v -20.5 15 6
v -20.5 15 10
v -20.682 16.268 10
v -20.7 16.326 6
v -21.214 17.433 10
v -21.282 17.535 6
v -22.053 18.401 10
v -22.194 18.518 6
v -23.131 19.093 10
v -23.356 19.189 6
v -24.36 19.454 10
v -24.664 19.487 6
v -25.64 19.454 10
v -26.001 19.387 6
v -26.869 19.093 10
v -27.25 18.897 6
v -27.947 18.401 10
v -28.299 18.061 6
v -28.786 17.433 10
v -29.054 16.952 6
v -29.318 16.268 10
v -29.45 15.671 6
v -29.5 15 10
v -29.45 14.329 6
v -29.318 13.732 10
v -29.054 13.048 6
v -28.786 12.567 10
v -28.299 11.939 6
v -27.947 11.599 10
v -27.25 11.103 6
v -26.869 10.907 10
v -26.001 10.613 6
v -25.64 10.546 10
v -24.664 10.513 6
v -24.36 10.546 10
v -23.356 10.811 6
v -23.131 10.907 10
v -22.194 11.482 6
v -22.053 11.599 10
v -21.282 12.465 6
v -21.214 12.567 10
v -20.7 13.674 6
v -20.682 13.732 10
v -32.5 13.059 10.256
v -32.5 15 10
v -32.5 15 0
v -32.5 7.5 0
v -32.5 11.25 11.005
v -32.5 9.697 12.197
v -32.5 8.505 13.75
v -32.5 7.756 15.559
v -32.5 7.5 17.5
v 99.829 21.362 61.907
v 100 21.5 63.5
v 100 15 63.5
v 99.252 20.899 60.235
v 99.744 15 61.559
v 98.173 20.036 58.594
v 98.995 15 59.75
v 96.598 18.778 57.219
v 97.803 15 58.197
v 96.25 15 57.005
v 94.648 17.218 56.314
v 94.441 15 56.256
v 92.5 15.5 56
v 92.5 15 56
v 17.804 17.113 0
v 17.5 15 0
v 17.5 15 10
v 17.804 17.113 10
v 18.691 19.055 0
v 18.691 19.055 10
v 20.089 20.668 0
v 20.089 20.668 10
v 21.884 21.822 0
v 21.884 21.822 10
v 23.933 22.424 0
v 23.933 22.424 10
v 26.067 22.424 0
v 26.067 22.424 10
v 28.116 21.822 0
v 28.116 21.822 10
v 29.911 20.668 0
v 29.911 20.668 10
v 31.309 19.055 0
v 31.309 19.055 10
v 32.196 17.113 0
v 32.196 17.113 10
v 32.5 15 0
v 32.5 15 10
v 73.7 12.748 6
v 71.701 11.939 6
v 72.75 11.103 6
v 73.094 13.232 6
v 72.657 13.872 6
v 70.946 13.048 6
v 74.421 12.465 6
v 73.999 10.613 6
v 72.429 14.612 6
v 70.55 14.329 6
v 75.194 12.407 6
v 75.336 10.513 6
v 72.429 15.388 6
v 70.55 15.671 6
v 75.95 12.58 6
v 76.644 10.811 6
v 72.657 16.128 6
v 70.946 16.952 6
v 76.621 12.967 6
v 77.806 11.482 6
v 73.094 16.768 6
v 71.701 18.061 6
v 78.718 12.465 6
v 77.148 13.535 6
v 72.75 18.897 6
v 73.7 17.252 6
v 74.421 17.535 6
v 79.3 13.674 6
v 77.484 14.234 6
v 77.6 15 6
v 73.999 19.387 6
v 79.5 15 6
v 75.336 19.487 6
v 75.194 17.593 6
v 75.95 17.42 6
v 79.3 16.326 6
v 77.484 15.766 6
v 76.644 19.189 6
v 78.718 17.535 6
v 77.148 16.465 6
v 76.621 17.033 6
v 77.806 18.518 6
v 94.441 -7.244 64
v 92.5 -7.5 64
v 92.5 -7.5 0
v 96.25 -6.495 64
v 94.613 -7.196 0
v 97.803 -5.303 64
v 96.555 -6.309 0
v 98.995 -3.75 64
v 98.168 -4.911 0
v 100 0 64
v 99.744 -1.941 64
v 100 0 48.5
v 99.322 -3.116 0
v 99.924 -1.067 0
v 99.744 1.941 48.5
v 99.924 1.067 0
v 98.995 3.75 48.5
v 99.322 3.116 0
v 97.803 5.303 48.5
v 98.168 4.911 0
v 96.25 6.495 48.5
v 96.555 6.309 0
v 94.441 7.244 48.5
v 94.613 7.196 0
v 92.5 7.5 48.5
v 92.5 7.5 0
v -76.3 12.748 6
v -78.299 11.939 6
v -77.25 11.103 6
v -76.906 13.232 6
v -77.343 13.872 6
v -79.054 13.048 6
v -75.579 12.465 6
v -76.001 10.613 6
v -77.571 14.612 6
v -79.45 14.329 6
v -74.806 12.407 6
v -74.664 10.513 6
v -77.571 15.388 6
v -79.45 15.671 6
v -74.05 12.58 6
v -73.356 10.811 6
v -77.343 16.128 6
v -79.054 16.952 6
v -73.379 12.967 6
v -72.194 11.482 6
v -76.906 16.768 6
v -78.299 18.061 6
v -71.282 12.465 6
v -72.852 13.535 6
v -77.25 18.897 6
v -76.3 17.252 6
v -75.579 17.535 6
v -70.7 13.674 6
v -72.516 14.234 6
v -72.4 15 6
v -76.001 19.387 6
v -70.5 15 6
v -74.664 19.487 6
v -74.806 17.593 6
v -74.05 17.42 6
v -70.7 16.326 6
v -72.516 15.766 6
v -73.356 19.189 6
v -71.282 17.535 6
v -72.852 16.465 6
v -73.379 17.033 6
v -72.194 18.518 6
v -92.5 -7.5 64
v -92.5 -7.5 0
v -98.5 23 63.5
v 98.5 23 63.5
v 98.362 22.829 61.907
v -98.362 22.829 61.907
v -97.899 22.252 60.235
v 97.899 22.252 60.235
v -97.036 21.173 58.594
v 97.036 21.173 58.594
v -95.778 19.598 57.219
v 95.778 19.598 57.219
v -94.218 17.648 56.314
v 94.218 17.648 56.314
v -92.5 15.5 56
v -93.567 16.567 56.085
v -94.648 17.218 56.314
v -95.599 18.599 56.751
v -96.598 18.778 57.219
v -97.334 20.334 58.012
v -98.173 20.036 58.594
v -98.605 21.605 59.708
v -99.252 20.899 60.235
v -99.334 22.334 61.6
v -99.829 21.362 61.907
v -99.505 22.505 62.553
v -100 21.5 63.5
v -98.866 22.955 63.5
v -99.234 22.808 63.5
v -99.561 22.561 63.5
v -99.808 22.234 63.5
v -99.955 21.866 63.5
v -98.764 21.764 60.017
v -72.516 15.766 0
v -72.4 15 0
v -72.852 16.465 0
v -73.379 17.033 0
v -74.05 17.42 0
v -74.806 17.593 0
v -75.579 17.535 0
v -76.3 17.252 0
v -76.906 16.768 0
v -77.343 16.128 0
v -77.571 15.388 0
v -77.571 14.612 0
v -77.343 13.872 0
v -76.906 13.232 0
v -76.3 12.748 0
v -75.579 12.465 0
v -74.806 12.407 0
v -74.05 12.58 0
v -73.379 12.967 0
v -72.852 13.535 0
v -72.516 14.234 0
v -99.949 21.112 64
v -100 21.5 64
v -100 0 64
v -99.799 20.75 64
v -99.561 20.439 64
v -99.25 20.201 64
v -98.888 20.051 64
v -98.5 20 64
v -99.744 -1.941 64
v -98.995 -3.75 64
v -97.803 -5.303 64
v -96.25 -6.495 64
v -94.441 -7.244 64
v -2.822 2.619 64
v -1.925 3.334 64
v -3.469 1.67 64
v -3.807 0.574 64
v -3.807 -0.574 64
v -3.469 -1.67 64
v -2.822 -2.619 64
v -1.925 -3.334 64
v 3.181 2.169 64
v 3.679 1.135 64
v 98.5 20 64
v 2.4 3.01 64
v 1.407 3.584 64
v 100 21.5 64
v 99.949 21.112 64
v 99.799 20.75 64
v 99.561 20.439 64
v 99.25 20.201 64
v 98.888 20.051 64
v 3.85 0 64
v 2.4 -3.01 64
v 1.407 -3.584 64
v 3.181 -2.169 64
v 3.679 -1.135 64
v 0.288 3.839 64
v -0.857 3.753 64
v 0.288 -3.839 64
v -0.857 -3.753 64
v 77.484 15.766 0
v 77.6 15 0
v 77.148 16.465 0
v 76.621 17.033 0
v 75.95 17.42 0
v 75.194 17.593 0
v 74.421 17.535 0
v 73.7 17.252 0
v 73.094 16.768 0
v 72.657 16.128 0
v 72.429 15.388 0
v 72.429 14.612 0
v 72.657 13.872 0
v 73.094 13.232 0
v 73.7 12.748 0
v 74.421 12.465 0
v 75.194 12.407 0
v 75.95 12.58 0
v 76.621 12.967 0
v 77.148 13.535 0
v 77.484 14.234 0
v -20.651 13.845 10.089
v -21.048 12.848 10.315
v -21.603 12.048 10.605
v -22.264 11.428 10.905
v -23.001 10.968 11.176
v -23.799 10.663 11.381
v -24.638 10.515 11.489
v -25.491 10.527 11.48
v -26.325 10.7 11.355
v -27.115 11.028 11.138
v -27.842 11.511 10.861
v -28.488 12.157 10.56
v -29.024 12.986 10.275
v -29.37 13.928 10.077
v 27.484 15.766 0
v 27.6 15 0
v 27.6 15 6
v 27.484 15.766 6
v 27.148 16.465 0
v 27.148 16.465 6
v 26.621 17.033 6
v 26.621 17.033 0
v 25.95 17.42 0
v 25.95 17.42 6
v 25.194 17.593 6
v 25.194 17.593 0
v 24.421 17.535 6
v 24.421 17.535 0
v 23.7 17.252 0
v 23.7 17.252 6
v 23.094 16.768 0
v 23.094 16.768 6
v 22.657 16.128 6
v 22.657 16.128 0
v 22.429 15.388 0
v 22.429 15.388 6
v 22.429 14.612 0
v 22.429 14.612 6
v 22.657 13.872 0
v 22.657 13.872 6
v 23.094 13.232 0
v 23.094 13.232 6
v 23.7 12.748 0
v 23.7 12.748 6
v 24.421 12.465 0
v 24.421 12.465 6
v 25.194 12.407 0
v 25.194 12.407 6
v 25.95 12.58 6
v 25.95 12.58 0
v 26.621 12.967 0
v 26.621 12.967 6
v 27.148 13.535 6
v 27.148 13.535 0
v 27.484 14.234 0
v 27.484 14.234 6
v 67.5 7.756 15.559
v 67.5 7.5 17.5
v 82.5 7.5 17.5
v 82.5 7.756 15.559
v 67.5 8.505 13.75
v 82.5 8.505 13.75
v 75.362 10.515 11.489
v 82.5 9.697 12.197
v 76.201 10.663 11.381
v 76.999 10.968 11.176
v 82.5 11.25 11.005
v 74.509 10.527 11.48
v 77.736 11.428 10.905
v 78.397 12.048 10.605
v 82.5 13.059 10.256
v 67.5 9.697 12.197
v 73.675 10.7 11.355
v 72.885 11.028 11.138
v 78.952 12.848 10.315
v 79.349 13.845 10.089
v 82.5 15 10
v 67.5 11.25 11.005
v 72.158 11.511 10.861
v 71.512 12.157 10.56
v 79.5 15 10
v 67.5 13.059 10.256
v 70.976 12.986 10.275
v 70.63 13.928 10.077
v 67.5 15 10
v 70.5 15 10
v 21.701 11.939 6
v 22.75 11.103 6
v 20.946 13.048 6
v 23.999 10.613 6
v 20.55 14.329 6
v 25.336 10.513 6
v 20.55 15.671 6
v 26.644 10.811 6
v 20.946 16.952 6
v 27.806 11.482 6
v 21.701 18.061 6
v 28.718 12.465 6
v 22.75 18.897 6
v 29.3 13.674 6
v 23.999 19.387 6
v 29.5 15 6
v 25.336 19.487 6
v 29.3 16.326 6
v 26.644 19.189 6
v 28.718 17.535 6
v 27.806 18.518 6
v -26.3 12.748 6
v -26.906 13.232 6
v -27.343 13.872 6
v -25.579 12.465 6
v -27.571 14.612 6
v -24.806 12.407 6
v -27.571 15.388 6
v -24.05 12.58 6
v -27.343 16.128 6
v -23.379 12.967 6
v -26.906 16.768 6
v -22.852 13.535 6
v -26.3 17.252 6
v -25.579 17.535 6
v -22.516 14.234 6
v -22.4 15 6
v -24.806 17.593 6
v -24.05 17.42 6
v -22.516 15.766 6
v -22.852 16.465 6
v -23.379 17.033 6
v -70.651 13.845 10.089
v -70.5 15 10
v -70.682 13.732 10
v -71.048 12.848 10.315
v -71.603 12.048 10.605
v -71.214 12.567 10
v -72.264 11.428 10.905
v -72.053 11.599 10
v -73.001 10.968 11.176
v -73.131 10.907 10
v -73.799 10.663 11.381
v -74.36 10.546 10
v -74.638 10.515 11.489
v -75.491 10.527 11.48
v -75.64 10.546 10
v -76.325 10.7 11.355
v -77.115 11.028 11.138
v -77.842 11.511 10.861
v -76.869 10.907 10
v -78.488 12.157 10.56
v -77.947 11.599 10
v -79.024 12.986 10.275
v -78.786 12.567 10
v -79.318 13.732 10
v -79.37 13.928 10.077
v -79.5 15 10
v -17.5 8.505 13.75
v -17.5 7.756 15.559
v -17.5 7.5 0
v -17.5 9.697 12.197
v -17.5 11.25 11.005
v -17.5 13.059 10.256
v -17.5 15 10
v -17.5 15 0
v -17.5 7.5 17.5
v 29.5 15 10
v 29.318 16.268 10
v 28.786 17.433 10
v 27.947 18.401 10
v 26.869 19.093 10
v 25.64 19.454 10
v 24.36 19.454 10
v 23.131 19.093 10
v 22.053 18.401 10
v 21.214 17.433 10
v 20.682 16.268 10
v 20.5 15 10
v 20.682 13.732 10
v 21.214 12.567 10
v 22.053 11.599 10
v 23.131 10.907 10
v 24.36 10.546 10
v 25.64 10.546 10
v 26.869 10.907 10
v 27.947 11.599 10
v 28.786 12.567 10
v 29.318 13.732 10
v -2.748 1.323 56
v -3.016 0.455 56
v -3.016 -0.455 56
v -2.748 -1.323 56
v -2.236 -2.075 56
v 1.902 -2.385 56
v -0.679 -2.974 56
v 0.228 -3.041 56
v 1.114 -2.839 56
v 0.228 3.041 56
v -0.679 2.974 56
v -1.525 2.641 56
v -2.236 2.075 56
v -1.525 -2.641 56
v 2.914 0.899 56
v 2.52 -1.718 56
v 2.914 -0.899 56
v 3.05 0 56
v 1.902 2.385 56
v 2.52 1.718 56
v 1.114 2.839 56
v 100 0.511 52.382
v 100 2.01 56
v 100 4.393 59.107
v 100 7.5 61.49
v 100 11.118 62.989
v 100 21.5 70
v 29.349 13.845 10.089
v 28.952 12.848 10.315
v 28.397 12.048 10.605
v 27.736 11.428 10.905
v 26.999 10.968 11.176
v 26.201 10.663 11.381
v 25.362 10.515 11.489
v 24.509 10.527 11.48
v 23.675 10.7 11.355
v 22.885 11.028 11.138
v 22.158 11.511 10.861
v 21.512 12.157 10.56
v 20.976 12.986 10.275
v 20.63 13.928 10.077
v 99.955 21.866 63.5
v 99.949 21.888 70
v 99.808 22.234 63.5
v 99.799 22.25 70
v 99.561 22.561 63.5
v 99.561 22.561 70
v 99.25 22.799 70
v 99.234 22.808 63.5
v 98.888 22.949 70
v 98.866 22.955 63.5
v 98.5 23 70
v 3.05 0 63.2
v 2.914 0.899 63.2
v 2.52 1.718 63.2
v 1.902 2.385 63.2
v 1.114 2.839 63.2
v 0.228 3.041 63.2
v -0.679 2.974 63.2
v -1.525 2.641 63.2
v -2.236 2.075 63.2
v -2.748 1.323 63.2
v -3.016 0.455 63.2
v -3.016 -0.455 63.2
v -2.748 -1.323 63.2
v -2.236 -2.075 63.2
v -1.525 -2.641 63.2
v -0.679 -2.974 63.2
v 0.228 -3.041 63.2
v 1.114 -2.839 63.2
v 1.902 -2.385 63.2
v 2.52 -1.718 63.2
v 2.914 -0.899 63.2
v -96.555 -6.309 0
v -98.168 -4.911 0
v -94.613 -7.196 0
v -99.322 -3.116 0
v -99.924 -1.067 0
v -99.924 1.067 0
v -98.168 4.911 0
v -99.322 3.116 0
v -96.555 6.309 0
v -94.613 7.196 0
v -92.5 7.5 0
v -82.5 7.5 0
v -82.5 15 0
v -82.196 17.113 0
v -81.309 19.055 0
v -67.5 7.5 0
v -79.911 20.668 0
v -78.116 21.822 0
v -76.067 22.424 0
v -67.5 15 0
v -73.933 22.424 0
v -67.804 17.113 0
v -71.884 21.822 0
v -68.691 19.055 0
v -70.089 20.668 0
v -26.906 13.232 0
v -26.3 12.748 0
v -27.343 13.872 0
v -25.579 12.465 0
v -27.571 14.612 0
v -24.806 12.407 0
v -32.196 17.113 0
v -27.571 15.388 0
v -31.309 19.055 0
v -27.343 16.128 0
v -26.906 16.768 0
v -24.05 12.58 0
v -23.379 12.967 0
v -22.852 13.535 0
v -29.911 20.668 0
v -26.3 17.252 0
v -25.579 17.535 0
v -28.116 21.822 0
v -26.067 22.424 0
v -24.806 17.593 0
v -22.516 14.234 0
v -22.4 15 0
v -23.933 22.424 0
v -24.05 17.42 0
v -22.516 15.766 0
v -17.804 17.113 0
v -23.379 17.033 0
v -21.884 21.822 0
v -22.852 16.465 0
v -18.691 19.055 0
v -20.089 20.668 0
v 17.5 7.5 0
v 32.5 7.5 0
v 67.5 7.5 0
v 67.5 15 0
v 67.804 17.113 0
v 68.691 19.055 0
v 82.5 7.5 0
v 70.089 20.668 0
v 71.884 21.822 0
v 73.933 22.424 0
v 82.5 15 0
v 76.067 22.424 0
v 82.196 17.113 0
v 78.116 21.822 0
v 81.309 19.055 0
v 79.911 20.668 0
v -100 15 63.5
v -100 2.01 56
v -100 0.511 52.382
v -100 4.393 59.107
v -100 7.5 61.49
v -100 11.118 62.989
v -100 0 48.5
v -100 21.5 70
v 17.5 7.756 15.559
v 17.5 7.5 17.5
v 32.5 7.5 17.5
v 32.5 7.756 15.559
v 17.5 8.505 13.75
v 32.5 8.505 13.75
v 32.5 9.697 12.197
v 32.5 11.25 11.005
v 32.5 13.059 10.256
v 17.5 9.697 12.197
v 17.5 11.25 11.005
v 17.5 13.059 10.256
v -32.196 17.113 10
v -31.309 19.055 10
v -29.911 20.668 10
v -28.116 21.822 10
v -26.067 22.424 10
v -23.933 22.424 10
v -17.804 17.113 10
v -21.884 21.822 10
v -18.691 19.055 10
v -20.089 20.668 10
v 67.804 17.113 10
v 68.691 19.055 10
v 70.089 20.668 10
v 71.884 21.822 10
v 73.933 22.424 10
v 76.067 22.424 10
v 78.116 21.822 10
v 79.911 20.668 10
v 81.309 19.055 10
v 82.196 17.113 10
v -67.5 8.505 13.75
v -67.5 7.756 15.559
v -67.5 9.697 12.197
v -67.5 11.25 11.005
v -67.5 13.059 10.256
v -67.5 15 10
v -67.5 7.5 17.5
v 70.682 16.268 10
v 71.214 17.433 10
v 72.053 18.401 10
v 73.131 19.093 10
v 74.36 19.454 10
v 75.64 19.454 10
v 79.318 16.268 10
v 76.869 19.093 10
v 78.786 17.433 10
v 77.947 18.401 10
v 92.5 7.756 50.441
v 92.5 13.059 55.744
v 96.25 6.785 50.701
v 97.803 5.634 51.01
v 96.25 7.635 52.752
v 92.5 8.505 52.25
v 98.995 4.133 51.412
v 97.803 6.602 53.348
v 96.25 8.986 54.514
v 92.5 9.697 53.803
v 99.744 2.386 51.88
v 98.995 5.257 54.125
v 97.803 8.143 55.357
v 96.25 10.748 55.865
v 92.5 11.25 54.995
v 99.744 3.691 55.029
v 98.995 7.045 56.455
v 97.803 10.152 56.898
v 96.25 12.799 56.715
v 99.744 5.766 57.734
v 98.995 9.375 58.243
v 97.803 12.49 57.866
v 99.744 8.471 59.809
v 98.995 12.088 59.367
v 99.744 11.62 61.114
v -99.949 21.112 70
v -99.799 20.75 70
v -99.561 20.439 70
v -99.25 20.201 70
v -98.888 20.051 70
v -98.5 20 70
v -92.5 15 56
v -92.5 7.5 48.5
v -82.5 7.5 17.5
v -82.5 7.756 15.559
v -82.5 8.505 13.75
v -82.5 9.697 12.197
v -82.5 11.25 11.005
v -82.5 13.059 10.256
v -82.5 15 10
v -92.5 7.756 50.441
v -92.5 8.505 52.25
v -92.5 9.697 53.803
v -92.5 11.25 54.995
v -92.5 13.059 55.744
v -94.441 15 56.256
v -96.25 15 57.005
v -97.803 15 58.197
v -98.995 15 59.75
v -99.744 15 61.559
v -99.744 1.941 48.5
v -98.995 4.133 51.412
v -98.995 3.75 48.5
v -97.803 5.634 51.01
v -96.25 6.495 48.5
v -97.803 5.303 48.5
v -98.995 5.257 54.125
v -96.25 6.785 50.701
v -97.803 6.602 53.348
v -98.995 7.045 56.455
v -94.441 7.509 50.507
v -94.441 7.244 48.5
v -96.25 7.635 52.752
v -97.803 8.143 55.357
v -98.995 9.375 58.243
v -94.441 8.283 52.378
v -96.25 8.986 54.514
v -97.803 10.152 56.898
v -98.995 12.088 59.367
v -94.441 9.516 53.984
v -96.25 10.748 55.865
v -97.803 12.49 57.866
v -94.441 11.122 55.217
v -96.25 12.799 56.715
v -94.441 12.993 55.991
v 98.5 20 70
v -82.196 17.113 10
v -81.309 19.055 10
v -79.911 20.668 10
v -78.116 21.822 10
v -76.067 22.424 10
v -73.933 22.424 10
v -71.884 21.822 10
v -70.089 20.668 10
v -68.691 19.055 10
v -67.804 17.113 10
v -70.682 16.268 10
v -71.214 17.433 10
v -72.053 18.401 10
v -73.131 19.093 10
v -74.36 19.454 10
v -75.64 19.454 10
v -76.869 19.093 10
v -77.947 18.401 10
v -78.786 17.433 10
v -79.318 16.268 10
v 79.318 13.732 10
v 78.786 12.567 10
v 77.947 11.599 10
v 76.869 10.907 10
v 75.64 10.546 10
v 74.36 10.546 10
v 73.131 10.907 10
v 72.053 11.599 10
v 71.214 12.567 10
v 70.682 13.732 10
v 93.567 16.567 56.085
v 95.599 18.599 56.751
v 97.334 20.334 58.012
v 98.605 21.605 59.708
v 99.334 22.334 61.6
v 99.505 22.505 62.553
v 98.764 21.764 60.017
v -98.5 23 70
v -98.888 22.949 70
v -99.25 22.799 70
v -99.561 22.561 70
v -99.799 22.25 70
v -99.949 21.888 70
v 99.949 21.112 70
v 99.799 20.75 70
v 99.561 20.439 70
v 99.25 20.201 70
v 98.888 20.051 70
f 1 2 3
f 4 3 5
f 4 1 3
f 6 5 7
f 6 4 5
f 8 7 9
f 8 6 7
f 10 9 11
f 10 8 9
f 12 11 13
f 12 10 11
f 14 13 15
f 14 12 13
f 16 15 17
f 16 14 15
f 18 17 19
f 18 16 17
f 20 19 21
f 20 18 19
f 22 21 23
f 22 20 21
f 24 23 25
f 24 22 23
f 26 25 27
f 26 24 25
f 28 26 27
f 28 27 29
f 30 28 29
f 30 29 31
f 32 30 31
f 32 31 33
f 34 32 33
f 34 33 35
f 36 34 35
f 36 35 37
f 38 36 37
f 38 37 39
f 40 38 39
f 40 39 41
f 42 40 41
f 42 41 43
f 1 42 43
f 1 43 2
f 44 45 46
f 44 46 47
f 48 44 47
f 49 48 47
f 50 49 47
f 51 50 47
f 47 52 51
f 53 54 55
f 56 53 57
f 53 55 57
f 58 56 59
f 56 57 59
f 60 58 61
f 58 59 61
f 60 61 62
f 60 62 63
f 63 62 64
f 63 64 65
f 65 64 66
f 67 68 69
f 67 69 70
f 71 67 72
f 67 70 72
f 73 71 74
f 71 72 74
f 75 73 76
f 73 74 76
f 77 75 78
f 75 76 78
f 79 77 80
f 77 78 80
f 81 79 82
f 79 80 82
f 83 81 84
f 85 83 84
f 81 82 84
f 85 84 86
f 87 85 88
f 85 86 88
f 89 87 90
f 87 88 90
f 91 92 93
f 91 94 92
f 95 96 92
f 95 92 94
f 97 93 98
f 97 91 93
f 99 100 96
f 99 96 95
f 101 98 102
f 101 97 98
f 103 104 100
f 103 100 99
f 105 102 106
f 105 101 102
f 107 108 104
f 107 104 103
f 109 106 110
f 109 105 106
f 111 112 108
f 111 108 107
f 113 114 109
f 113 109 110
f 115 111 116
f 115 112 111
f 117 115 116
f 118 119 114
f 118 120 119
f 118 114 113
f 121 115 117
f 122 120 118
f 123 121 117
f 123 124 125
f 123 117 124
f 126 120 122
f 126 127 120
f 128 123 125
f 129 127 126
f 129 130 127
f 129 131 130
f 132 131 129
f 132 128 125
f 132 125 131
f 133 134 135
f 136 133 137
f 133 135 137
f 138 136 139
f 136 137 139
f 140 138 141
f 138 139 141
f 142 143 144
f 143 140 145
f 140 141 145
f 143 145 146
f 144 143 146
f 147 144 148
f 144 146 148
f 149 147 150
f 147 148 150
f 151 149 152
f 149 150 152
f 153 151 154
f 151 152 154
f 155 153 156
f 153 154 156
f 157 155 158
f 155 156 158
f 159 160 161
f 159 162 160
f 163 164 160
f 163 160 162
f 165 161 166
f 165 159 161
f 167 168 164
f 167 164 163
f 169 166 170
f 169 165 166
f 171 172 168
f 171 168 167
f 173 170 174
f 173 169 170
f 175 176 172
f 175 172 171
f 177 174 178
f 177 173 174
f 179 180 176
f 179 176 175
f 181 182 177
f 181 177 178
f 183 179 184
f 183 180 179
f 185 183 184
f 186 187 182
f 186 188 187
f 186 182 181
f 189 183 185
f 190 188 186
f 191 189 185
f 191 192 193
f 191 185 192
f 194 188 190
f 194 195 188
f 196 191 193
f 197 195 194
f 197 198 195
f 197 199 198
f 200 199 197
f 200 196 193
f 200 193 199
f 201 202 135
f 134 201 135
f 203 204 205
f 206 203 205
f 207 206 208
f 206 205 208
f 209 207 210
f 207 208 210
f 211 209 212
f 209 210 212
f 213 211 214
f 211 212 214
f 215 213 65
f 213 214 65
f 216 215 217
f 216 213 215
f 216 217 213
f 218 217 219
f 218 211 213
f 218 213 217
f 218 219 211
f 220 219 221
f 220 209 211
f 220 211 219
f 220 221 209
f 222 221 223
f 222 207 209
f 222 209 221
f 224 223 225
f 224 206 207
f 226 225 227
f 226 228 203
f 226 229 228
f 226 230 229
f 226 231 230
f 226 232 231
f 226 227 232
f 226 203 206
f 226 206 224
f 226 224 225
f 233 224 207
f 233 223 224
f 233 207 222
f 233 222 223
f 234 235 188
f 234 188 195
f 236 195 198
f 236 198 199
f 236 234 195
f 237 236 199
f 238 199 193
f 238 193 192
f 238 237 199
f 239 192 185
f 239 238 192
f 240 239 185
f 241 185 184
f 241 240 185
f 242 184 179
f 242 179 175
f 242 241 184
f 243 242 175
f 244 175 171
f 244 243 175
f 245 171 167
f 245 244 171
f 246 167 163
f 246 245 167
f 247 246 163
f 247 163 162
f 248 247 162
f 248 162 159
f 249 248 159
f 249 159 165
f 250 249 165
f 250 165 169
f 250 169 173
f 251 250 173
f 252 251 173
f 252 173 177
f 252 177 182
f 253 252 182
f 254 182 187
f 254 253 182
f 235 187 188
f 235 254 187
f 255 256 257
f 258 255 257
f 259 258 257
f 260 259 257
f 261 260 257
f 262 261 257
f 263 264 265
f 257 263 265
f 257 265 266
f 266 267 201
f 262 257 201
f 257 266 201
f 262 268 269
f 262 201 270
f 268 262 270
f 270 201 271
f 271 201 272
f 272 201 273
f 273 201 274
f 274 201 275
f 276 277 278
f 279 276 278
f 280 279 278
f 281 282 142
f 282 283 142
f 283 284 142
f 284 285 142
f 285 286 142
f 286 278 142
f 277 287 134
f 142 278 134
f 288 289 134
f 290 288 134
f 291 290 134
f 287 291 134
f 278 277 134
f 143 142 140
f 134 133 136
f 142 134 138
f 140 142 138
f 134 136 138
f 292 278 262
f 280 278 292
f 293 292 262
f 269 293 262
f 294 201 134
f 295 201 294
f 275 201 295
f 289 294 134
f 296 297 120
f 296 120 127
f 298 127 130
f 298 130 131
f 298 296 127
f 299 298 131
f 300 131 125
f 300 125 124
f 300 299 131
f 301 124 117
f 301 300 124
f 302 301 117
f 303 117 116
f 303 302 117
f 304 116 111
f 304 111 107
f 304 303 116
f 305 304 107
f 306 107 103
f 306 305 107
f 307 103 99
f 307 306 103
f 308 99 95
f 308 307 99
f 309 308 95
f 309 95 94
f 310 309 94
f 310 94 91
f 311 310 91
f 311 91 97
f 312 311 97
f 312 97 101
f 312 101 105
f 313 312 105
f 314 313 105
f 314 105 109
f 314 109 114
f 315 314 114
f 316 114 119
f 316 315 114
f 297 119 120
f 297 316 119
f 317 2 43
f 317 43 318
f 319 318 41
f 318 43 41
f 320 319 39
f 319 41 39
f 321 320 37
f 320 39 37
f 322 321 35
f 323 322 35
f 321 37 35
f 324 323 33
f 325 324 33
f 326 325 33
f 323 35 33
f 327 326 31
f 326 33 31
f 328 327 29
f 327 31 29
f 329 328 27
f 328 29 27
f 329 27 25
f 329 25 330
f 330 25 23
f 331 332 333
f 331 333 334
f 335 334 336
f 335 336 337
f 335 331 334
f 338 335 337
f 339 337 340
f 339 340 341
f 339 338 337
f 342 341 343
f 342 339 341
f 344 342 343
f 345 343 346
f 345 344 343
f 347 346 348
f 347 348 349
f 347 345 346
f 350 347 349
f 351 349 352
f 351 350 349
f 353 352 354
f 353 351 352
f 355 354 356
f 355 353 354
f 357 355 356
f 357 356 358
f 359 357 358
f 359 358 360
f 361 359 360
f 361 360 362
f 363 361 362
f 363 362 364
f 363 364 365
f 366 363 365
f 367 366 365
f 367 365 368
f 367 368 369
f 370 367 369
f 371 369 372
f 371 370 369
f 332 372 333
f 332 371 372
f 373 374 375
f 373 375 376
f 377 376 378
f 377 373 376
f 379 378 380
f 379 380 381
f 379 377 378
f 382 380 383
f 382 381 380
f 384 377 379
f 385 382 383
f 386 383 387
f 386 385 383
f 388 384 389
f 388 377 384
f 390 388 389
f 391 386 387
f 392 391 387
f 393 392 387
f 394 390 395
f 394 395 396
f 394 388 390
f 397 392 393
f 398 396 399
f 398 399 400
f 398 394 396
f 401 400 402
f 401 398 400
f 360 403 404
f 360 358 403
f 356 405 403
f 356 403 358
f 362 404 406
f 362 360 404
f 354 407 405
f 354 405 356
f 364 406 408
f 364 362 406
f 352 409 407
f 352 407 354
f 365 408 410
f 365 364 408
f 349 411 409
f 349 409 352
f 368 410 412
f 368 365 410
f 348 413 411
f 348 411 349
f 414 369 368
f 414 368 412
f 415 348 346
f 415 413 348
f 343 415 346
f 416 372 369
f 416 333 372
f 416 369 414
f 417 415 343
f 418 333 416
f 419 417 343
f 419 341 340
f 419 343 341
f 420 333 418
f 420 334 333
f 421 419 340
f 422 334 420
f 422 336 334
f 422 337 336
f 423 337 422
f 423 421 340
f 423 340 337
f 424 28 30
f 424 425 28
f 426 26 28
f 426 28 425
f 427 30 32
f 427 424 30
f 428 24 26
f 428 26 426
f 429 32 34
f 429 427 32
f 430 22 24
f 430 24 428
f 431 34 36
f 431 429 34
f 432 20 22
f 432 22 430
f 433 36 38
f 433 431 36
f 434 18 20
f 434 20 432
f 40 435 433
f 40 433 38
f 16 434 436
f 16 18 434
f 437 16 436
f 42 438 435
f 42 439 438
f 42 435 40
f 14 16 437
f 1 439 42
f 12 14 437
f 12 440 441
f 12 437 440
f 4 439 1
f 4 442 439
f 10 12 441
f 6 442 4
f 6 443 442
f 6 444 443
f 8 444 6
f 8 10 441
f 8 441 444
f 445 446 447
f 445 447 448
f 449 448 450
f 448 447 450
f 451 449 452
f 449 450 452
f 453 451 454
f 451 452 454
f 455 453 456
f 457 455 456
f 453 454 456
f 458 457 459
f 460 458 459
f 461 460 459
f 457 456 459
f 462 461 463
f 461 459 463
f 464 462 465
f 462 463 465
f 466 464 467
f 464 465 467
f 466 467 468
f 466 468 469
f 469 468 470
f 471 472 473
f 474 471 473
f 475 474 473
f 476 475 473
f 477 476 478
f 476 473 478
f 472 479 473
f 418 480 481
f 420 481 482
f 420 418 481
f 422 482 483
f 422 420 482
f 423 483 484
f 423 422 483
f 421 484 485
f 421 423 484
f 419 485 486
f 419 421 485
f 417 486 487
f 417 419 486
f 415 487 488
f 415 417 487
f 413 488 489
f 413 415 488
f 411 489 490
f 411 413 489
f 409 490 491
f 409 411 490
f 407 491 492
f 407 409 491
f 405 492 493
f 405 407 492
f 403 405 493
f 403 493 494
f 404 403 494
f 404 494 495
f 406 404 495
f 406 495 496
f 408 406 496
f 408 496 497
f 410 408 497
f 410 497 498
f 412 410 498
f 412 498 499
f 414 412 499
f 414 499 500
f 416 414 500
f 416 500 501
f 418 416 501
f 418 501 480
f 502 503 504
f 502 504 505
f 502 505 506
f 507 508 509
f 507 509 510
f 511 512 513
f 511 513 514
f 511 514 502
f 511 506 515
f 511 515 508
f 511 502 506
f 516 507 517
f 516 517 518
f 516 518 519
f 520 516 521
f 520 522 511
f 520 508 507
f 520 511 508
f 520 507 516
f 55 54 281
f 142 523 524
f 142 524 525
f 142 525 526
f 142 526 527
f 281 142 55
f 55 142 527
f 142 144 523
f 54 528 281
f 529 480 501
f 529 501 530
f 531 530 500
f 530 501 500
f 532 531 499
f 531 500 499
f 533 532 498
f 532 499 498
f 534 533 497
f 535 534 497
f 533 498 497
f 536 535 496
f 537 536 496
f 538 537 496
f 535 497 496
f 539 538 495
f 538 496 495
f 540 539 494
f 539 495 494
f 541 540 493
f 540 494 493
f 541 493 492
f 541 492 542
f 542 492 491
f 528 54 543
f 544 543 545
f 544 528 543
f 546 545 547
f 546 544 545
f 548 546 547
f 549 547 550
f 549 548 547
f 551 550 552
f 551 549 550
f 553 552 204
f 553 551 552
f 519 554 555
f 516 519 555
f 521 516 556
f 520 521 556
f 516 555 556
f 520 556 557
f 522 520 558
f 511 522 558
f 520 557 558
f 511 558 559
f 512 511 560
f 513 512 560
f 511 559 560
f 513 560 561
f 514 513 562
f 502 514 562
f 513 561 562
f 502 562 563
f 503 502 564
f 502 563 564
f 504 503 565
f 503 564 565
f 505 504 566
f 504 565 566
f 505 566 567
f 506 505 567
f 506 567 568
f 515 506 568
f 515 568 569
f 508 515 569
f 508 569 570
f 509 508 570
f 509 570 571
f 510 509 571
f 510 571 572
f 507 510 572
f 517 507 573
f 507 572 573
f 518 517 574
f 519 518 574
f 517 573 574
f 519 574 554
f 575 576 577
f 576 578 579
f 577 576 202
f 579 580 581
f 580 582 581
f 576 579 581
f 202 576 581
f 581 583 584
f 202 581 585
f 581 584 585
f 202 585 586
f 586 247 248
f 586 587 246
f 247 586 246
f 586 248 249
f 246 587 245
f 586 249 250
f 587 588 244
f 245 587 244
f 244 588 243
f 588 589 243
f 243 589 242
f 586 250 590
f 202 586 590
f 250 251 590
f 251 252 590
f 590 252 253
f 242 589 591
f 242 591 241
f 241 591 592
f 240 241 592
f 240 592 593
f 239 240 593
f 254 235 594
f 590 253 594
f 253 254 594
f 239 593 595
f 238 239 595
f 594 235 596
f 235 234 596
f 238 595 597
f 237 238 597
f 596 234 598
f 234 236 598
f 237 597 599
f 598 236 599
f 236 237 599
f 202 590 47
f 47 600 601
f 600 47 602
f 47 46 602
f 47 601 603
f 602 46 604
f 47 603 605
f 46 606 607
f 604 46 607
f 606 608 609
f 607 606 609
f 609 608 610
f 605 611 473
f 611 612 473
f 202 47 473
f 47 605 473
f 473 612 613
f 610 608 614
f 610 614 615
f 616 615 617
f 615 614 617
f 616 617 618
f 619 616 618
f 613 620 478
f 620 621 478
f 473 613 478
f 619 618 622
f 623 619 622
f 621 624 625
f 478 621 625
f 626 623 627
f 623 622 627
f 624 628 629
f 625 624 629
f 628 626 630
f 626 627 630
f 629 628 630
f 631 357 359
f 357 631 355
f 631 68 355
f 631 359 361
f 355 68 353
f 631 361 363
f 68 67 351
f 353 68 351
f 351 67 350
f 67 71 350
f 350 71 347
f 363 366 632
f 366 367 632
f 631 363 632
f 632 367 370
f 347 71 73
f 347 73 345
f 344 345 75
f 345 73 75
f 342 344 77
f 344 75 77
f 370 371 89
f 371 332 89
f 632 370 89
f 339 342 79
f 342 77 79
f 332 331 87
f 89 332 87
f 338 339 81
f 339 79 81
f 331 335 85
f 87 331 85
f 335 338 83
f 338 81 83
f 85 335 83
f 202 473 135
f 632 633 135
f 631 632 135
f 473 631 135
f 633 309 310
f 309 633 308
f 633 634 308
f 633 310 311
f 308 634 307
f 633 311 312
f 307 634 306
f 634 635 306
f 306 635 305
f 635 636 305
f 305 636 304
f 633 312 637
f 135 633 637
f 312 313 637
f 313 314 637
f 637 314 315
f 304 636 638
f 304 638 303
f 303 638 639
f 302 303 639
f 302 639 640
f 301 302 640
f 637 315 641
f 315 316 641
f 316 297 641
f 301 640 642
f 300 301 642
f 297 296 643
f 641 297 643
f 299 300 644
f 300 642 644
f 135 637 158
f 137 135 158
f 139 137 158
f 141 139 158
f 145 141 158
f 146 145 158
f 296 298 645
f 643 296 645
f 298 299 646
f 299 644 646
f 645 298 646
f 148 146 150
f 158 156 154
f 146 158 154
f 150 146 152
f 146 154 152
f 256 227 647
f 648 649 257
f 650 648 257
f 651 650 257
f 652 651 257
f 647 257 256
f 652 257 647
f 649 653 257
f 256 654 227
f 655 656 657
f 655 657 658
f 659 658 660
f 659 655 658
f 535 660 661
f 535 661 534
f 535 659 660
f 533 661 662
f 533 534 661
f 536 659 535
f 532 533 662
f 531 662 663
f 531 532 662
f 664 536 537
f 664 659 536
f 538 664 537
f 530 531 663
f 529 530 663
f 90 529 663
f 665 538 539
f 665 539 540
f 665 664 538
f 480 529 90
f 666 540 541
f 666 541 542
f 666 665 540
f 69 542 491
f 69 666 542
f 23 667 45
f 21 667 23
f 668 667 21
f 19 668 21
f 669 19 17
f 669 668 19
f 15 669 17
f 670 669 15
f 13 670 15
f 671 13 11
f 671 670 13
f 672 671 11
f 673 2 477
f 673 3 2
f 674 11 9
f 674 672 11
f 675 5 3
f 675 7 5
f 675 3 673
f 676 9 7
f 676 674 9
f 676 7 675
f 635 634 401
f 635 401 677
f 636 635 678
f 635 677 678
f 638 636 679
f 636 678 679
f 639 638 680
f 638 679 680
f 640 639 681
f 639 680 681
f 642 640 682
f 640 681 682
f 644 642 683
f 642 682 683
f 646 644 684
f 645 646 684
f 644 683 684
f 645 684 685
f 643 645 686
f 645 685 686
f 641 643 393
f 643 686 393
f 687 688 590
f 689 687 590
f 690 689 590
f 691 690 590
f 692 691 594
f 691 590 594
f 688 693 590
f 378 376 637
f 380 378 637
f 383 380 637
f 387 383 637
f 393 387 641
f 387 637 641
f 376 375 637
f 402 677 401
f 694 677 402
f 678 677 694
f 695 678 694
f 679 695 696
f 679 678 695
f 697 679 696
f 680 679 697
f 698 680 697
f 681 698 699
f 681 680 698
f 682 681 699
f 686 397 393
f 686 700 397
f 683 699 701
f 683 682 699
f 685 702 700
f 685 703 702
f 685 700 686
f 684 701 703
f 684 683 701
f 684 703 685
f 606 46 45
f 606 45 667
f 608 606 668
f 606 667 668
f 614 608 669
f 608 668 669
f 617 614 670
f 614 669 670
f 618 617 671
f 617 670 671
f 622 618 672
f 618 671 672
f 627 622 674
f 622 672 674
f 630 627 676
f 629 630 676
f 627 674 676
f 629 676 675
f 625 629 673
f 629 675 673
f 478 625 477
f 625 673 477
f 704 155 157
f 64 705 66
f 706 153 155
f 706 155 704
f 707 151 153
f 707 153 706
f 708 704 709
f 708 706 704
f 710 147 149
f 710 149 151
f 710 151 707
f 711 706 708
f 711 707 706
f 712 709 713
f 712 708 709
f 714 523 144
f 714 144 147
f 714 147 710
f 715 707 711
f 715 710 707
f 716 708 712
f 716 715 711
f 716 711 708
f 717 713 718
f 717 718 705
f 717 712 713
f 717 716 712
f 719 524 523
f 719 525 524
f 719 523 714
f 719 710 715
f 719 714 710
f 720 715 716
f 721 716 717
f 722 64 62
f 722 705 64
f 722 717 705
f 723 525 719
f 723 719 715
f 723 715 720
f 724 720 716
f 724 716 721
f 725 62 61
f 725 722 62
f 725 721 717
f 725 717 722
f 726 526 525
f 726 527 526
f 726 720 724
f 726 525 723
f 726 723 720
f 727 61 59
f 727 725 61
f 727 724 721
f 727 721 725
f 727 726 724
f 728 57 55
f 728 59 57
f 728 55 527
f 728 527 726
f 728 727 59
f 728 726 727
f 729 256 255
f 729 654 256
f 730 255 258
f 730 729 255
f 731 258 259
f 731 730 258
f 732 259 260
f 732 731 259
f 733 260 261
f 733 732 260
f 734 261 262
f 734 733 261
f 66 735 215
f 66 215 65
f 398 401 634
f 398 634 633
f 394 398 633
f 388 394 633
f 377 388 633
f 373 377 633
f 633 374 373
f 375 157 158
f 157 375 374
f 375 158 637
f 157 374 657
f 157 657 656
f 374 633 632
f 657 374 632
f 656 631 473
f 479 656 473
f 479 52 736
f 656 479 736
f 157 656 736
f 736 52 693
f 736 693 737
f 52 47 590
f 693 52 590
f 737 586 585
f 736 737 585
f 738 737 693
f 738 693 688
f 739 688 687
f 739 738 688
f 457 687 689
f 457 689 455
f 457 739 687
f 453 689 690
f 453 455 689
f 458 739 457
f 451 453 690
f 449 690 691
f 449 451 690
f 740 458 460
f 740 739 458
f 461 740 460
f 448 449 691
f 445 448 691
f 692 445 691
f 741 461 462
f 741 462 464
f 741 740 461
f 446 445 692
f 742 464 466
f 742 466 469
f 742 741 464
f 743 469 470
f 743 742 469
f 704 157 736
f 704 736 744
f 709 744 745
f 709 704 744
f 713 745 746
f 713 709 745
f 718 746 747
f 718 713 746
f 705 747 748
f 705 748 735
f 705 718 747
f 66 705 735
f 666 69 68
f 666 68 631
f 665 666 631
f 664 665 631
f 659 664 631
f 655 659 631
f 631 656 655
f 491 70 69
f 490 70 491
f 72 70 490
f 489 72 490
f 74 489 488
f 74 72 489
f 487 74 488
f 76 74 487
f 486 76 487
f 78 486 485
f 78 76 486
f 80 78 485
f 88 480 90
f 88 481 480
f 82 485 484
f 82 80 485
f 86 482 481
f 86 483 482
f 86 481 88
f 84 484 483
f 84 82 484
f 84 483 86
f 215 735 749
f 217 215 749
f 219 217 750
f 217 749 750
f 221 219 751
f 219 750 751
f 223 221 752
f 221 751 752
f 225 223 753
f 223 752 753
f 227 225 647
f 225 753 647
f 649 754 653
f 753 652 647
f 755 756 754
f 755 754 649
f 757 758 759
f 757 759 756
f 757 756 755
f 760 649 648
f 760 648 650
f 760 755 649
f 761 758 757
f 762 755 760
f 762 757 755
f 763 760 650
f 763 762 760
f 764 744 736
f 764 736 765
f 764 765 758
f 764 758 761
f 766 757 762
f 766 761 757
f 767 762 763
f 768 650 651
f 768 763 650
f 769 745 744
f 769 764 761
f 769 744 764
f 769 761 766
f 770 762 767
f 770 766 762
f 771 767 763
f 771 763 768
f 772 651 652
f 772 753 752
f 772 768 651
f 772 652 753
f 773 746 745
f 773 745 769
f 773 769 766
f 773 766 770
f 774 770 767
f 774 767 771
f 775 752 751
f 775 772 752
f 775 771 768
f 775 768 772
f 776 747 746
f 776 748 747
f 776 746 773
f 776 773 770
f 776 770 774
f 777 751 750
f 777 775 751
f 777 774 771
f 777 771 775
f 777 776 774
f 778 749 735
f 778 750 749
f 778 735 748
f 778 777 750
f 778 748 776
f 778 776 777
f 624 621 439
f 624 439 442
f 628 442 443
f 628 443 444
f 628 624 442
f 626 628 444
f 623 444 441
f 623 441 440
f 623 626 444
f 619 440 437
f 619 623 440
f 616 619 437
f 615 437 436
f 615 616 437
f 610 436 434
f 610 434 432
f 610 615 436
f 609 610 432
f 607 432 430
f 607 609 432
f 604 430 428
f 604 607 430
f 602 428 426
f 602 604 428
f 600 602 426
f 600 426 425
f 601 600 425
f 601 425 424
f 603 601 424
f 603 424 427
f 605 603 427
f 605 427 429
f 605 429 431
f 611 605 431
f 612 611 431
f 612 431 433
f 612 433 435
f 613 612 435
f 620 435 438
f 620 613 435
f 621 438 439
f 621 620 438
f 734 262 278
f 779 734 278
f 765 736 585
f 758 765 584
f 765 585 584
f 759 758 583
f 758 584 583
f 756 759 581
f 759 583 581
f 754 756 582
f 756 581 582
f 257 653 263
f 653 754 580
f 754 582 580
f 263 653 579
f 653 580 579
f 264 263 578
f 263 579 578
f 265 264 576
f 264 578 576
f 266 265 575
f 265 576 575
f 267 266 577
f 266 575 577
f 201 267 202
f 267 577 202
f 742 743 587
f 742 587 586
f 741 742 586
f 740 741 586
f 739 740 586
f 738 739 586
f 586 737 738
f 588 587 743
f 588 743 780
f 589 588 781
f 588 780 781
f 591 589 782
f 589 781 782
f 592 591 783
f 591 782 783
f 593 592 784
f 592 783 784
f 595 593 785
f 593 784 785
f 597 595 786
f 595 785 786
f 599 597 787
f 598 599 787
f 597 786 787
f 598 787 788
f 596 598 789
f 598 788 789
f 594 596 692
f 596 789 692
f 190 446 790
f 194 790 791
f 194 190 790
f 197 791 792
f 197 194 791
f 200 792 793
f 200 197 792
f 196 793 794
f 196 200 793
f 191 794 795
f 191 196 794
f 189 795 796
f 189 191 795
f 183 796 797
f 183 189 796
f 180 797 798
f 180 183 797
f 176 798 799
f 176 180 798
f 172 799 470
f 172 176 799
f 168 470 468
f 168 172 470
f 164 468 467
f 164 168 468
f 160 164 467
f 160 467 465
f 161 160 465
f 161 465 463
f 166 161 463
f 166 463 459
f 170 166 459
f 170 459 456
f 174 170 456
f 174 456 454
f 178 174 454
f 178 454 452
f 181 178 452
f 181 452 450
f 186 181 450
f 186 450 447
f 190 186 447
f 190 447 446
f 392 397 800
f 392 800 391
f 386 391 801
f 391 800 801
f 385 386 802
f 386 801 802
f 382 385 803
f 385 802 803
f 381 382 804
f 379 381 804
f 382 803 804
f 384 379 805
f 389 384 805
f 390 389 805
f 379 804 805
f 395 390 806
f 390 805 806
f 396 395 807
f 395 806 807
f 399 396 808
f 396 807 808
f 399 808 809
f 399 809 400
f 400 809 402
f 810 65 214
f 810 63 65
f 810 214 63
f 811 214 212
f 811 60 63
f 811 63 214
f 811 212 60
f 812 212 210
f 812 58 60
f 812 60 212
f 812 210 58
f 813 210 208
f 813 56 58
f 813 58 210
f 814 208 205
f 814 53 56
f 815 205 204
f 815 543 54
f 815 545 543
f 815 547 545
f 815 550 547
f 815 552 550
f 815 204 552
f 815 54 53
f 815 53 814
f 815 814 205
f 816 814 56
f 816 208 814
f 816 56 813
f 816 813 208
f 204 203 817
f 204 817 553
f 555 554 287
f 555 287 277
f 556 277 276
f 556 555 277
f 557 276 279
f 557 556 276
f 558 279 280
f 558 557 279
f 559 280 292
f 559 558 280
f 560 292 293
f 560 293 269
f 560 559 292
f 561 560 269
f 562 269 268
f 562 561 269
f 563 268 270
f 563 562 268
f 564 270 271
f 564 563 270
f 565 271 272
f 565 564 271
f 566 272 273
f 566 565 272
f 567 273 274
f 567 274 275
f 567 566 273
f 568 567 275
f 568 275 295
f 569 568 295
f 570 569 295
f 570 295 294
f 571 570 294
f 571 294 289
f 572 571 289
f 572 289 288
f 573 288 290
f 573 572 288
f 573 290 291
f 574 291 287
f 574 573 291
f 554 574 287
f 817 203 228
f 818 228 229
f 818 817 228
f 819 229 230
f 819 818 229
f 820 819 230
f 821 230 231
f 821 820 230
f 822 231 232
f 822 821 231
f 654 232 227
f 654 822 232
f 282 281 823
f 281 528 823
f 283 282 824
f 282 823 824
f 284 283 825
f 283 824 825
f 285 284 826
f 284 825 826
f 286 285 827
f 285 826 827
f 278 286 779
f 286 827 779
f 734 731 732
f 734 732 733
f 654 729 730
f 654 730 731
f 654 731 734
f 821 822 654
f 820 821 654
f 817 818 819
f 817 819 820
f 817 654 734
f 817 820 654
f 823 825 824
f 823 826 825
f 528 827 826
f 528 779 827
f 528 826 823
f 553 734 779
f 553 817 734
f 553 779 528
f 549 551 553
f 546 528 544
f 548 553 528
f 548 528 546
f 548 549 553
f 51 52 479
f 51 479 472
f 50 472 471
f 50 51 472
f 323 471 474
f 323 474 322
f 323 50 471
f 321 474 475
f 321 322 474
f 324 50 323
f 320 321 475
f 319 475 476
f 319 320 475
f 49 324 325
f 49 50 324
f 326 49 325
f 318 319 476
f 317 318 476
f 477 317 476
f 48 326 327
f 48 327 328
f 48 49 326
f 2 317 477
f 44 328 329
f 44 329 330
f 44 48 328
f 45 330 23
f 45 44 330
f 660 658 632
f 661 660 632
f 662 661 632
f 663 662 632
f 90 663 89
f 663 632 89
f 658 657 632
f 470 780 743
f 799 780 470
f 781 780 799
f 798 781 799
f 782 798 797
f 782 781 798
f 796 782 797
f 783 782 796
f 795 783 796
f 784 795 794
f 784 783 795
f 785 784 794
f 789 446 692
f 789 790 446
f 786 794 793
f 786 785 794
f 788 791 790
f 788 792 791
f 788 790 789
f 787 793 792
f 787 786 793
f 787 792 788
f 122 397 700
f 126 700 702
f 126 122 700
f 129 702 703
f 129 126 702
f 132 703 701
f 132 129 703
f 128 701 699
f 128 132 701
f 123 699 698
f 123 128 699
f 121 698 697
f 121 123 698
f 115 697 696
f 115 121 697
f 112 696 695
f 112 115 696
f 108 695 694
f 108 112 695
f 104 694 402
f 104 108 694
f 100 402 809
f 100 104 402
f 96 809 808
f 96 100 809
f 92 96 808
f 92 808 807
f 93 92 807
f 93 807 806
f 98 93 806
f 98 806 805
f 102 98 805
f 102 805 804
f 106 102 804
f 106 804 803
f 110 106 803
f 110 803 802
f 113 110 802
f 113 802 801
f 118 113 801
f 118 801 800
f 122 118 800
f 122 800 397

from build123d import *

# Parameters (mm, degrees)
SKETCH1_W             = 15
SKETCH1_H             = 15
SKETCH1_R             = 2.6
BOSS_EXTRUDE1_DEPTH   = 6
BOSS_EXTRUDE1_2_DEPTH = 6
BOSS_EXTRUDE1_3_DEPTH = 6
BOSS_EXTRUDE1_4_DEPTH = 6
BOSS_EXTRUDE2_DEPTH   = 64
SKETCH2_R             = 3.05
CUT_EXTRUDE1_DEPTH    = 8
SKETCH3_W             = 15
SKETCH3_H             = 15
SKETCH3_R             = 4.5
BOSS_EXTRUDE3_DEPTH   = 4
CHAMFER1_SIZE         = 0.8
SKETCH4_W             = 200
SKETCH4_H             = 8
BOSS_EXTRUDE4_DEPTH   = 15.5
SKETCH5_W             = 200
SKETCH5_H             = 3
BOSS_EXTRUDE5_DEPTH   = 6
FILLET3_R             = 7.5
FILLET4_R             = 1.5


# Some blends are built 0.0001 mm under size
with BuildPart() as part:
    # Sketch1 → Boss-Extrude1 (new body)
    with BuildSketch(Plane.XY):
        with Locations((-25, 15)):
            Rectangle(SKETCH1_W, SKETCH1_H)
        with Locations((-25, 15)):
            Circle(SKETCH1_R, mode=Mode.SUBTRACT)
    extrude(amount=BOSS_EXTRUDE1_DEPTH)



with BuildPart() as body_2:
    # Sketch1 → Boss-Extrude1 2 (new body)
    with BuildSketch(Plane.XY):
        with Locations((25, 15)):
            Rectangle(SKETCH1_W, SKETCH1_H)
        with Locations((25, 15)):
            Circle(SKETCH1_R, mode=Mode.SUBTRACT)
    extrude(amount=BOSS_EXTRUDE1_2_DEPTH)


with BuildPart() as body_3:
    # Sketch1 → Boss-Extrude1 3 (new body)
    with BuildSketch(Plane.XY):
        with Locations((-75, 15)):
            Rectangle(SKETCH1_W, SKETCH1_H)
        with Locations((-75, 15)):
            Circle(SKETCH1_R, mode=Mode.SUBTRACT)
    extrude(amount=BOSS_EXTRUDE1_3_DEPTH)


with BuildPart() as body_4:
    # Sketch1 → Boss-Extrude1 4 (new body)
    with BuildSketch(Plane.XY):
        with Locations((75, 15)):
            Rectangle(SKETCH1_W, SKETCH1_H)
        with Locations((75, 15)):
            Circle(SKETCH1_R, mode=Mode.SUBTRACT)
    extrude(amount=BOSS_EXTRUDE1_4_DEPTH)


with BuildPart() as part_1:
    add(part.part)

    add(body_2.part)  # Boss-Extrude2 merges body 2

    add(body_3.part)  # Boss-Extrude2 merges body 3
    # Sketch1<4> → Boss-Extrude2 (add)
    with BuildSketch(Plane.XY):
        Polygon((-100, 7.5), (-100, -7.5), (100, -7.5), (100, 7.5), (82.5, 7.5), (67.5, 7.5), (32.5, 7.5), (17.5, 7.5), (-17.5, 7.5), (-32.5, 7.5), (-67.5, 7.5), (-82.5, 7.5), align=None)
    extrude(amount=BOSS_EXTRUDE2_DEPTH)

    # Sketch2 → Cut-Extrude1 (cut)
    with BuildSketch(Plane.XY.offset(64)):
        Circle(SKETCH2_R)
    extrude(amount=-CUT_EXTRUDE1_DEPTH, mode=Mode.SUBTRACT)


    add(body_4.part)  # Boss-Extrude3 merges body 4
    # Sketch3 → Boss-Extrude3 (add)
    # profile 1 of 4: a face of its own
    with BuildSketch(Plane.XY.offset(6)):
        with Locations((75, 15)):
            Rectangle(SKETCH3_W, SKETCH3_H)
        with Locations((75, 15)):
            Circle(SKETCH3_R, mode=Mode.SUBTRACT)
    # profile 2 of 4: a face of its own
    with BuildSketch(Plane.XY.offset(6)):
        with Locations((25, 15)):
            Rectangle(SKETCH3_W, SKETCH3_H)
        with Locations((25, 15)):
            Circle(SKETCH3_R, mode=Mode.SUBTRACT)
    # profile 3 of 4: a face of its own
    with BuildSketch(Plane.XY.offset(6)):
        with Locations((-25, 15)):
            Rectangle(SKETCH3_W, SKETCH3_H)
        with Locations((-25, 15)):
            Circle(SKETCH3_R, mode=Mode.SUBTRACT)
    # profile 4 of 4: a face of its own
    with BuildSketch(Plane.XY.offset(6)):
        with Locations((-75, 15)):
            Rectangle(SKETCH3_W, SKETCH3_H)
        with Locations((-75, 15)):
            Circle(SKETCH3_R, mode=Mode.SUBTRACT)
    extrude(amount=BOSS_EXTRUDE3_DEPTH)

    # Chamfer1
    chamfer1_edges = [part_1.edges().sort_by_distance(p)[0] for p in [
        (-3.05, 0, 64),
    ]]
    chamfer(chamfer1_edges, length=CHAMFER1_SIZE)

    # Sketch4 → Boss-Extrude4 (add)
    with BuildSketch(Plane(origin=(0, 7.5, 0), x_dir=(1, 0, 0), z_dir=(0, 1, 0))):
        with Locations((0, -60)):
            Rectangle(SKETCH4_W, SKETCH4_H)
    extrude(amount=BOSS_EXTRUDE4_DEPTH)

    # Sketch5 → Boss-Extrude5 (add)
    with BuildSketch(Plane.XY.offset(64)):
        with Locations((0, 21.5)):
            Rectangle(SKETCH5_W, SKETCH5_H)
    extrude(amount=BOSS_EXTRUDE5_DEPTH)

    # Fillet3
    # the kernel refuses this fillet: 7.5 mm, written as the material it adds along each edge
    with BuildSketch(Plane(origin=(-82.5, 7.5, 10), x_dir=(0, 1, 0), z_dir=(1, 0, 0))) as fillet3_piece_1_section:
        with BuildLine():
            CenterArc((FILLET3_R, FILLET3_R), FILLET3_R, 180, 90)
            Line((0, FILLET3_R), (0, 0))
            Line((0, 0), (FILLET3_R, 0))
        make_face()
    fillet3_piece_1 = extrude(amount=15, mode=Mode.PRIVATE)
    fillet3_piece_1 = fillet3_piece_1 - Plane(origin=(-75, 15, 10), x_dir=(1, 0, 0), z_dir=(0, 0, -1)) * Cylinder(4.5, 60, mode=Mode.PRIVATE)
    add(fillet3_piece_1)
    with BuildSketch(Plane(origin=(-32.5, 7.5, 10), x_dir=(0, 1, 0), z_dir=(1, 0, 0))) as fillet3_piece_2_section:
        with BuildLine():
            CenterArc((FILLET3_R, FILLET3_R), FILLET3_R, 180, 90)
            Line((0, FILLET3_R), (0, 0))
            Line((0, 0), (FILLET3_R, 0))
        make_face()
    fillet3_piece_2 = extrude(amount=15, mode=Mode.PRIVATE)
    fillet3_piece_2 = fillet3_piece_2 - Plane(origin=(-25, 15, 10), x_dir=(1, 0, 0), z_dir=(0, 0, -1)) * Cylinder(4.5, 61, mode=Mode.PRIVATE)
    add(fillet3_piece_2)
    with BuildSketch(Plane(origin=(17.5, 7.5, 10), x_dir=(0, 1, 0), z_dir=(1, 0, 0))) as fillet3_piece_3_section:
        with BuildLine():
            CenterArc((FILLET3_R, FILLET3_R), FILLET3_R, 180, 90)
            Line((0, FILLET3_R), (0, 0))
            Line((0, 0), (FILLET3_R, 0))
        make_face()
    fillet3_piece_3 = extrude(amount=15, mode=Mode.PRIVATE)
    fillet3_piece_3 = fillet3_piece_3 - Plane(origin=(25, 15, 10), x_dir=(1, 0, 0), z_dir=(0, 0, -1)) * Cylinder(4.5, 61, mode=Mode.PRIVATE)
    add(fillet3_piece_3)
    with BuildSketch(Plane(origin=(67.5, 7.5, 10), x_dir=(0, 1, 0), z_dir=(1, 0, 0))) as fillet3_piece_4_section:
        with BuildLine():
            CenterArc((FILLET3_R, FILLET3_R), FILLET3_R, 180, 90)
            Line((0, FILLET3_R), (0, 0))
            Line((0, 0), (FILLET3_R, 0))
        make_face()
    fillet3_piece_4 = extrude(amount=15, mode=Mode.PRIVATE)
    fillet3_piece_4 = fillet3_piece_4 - Plane(origin=(75, 15, 10), x_dir=(1, 0, 0), z_dir=(0, 0, -1)) * Cylinder(4.5, 60, mode=Mode.PRIVATE)
    add(fillet3_piece_4)
    with BuildSketch(Plane(origin=(100, 7.5, 56), x_dir=(0, 0, -1), z_dir=(-1, 0, 0))) as fillet3_piece_5:
        with BuildLine():
            CenterArc((FILLET3_R, -FILLET3_R), FILLET3_R, 90, 90)
            Line((0, -FILLET3_R), (0, 0))
            Line((0, 0), (FILLET3_R, 0))
        make_face()
    extrude(amount=200)
    # the kernel refuses this fillet: 7.5 mm, written as the material it takes off along each edge
    with BuildSketch(Plane(origin=(100, -7.5, -18.75), x_dir=(-1, 0, 0), z_dir=(0, 0, 1))) as fillet3_2_piece_1:
        with BuildLine():
            CenterArc((FILLET3_R, -FILLET3_R), FILLET3_R, 90, 90)
            Line((0, -FILLET3_R), (0, 0))
            Line((0, 0), (FILLET3_R, 0))
        make_face()
    extrude(amount=101.5, mode=Mode.SUBTRACT)
    with BuildSketch(Plane(origin=(-100, -7.5, -18.75), x_dir=(1, 0, 0), z_dir=(0, 0, 1))) as fillet3_2_piece_2:
        with BuildLine():
            CenterArc((FILLET3_R, FILLET3_R), FILLET3_R, 180, 90)
            Line((0, FILLET3_R), (0, 0))
            Line((0, 0), (FILLET3_R, 0))
        make_face()
    extrude(amount=101.5, mode=Mode.SUBTRACT)
    with BuildSketch(Plane(origin=(67.5, 22.5, 28.75), x_dir=(0, -1, 0), z_dir=(0, 0, -1)), Plane(origin=(-82.5, 22.5, 28.75), x_dir=(0, -1, 0), z_dir=(0, 0, -1)), Plane(origin=(17.5, 22.5, 28.75), x_dir=(0, -1, 0), z_dir=(0, 0, -1)), Plane(origin=(-32.5, 22.5, 28.75), x_dir=(0, -1, 0), z_dir=(0, 0, -1))) as fillet3_2_piece_3:
        with BuildLine():
            CenterArc((FILLET3_R, -FILLET3_R), FILLET3_R, 90, 90)
            Line((0, -FILLET3_R), (0, 0))
            Line((0, 0), (FILLET3_R, 0))
        make_face()
    extrude(amount=47.5, mode=Mode.SUBTRACT)
    with BuildSketch(Plane(origin=(-67.5, 22.5, -18.75), x_dir=(-1, 0, 0), z_dir=(0, 0, 1)), Plane(origin=(-17.5, 22.5, -18.75), x_dir=(-1, 0, 0), z_dir=(0, 0, 1)), Plane(origin=(32.5, 22.5, -18.75), x_dir=(-1, 0, 0), z_dir=(0, 0, 1)), Plane(origin=(82.5, 22.5, -18.75), x_dir=(-1, 0, 0), z_dir=(0, 0, 1))) as fillet3_2_piece_4:
        with BuildLine():
            CenterArc((FILLET3_R, FILLET3_R), FILLET3_R, 180, 90)
            Line((0, FILLET3_R), (0, 0))
            Line((0, 0), (FILLET3_R, 0))
        make_face()
    extrude(amount=47.5, mode=Mode.SUBTRACT)
    with BuildSketch(Plane(origin=(118.75, 23, 56), x_dir=(0, -1, 0), z_dir=(-1, 0, 0))) as fillet3_2_piece_5:
        with BuildLine():
            CenterArc((FILLET3_R, FILLET3_R), FILLET3_R, 180, 90)
            Line((0, FILLET3_R), (0, 0))
            Line((0, 0), (FILLET3_R, 0))
        make_face()
    extrude(amount=237.5, mode=Mode.SUBTRACT)
    # the kernel refuses this fillet: 7.5 mm, written as the material it takes off along each edge
    with BuildSketch(Plane(origin=(-100, 7.5, -18.75), x_dir=(0, -1, 0), z_dir=(0, 0, 1)), Plane(origin=(100, 7.5, -18.75), x_dir=(-1, 0, 0), z_dir=(0, 0, 1))) as fillet3_3_piece_1:
        with BuildLine():
            CenterArc((FILLET3_R, FILLET3_R), FILLET3_R, 180, 90)
            Line((0, FILLET3_R), (0, 0))
            Line((0, 0), (FILLET3_R, 0))
        make_face()
    extrude(amount=67.25, mode=Mode.SUBTRACT)
    with BuildSketch(Plane(origin=(100, 15, 56), x_dir=(-1, 0, 0), z_dir=(0, 1, 0)), Plane(origin=(-100, 15, 56), x_dir=(0, 0, 1), z_dir=(0, 1, 0))) as fillet3_3_piece_2:
        with BuildLine():
            CenterArc((FILLET3_R, FILLET3_R), FILLET3_R, 180, 90)
            Line((0, FILLET3_R), (0, 0))
            Line((0, 0), (FILLET3_R, 0))
        make_face()
    extrude(amount=19.25, mode=Mode.SUBTRACT)
    with BuildSketch(Plane(origin=(-100, 15, 48.5), x_dir=(0, -1, 0), z_dir=(0, 0, -1))) as fillet3_3_piece_3:
        with BuildLine():
            CenterArc((7.5 + FILLET3_R, -FILLET3_R), FILLET3_R, 90, 90)
            Line((7.5, -FILLET3_R), (7.5, 0))
            Line((7.5, 0), (7.5 + FILLET3_R, 0))
        make_face()
    revolve(axis=Axis((-100, 15, 48.5), (-1, 0, 0)), revolution_arc=90, mode=Mode.SUBTRACT)
    with BuildSketch(Plane(origin=(100, 15, 48.5), x_dir=(0, -1, 0), z_dir=(0, 0, -1))) as fillet3_3_piece_4:
        with BuildLine():
            CenterArc((7.5 + FILLET3_R, FILLET3_R), FILLET3_R, 180, 90)
            Line((7.5 + FILLET3_R, 0), (7.5, 0))
            Line((7.5, 0), (7.5, FILLET3_R))
        make_face()
    revolve(axis=Axis((100, 15, 48.5), (-1, 0, 0)), revolution_arc=90, mode=Mode.SUBTRACT)

    # Fillet4
    fillet4_edges = [part_1.edges().sort_by_distance(p)[0] for p in [
        (-97.803300859, 20.803300859, 58.196699141),
        (97.803300859, 20.803300859, 58.196699141),
        (-100, 20, 67),
        (-100, 23, 66.75),
        (100, 23, 66.75),
        (100, 20, 67),
    ]]
    fillet(fillet4_edges, radius=FILLET4_R - 0.0001)  # a hair under: the kernel refuses the full size


solid = part_1.part
